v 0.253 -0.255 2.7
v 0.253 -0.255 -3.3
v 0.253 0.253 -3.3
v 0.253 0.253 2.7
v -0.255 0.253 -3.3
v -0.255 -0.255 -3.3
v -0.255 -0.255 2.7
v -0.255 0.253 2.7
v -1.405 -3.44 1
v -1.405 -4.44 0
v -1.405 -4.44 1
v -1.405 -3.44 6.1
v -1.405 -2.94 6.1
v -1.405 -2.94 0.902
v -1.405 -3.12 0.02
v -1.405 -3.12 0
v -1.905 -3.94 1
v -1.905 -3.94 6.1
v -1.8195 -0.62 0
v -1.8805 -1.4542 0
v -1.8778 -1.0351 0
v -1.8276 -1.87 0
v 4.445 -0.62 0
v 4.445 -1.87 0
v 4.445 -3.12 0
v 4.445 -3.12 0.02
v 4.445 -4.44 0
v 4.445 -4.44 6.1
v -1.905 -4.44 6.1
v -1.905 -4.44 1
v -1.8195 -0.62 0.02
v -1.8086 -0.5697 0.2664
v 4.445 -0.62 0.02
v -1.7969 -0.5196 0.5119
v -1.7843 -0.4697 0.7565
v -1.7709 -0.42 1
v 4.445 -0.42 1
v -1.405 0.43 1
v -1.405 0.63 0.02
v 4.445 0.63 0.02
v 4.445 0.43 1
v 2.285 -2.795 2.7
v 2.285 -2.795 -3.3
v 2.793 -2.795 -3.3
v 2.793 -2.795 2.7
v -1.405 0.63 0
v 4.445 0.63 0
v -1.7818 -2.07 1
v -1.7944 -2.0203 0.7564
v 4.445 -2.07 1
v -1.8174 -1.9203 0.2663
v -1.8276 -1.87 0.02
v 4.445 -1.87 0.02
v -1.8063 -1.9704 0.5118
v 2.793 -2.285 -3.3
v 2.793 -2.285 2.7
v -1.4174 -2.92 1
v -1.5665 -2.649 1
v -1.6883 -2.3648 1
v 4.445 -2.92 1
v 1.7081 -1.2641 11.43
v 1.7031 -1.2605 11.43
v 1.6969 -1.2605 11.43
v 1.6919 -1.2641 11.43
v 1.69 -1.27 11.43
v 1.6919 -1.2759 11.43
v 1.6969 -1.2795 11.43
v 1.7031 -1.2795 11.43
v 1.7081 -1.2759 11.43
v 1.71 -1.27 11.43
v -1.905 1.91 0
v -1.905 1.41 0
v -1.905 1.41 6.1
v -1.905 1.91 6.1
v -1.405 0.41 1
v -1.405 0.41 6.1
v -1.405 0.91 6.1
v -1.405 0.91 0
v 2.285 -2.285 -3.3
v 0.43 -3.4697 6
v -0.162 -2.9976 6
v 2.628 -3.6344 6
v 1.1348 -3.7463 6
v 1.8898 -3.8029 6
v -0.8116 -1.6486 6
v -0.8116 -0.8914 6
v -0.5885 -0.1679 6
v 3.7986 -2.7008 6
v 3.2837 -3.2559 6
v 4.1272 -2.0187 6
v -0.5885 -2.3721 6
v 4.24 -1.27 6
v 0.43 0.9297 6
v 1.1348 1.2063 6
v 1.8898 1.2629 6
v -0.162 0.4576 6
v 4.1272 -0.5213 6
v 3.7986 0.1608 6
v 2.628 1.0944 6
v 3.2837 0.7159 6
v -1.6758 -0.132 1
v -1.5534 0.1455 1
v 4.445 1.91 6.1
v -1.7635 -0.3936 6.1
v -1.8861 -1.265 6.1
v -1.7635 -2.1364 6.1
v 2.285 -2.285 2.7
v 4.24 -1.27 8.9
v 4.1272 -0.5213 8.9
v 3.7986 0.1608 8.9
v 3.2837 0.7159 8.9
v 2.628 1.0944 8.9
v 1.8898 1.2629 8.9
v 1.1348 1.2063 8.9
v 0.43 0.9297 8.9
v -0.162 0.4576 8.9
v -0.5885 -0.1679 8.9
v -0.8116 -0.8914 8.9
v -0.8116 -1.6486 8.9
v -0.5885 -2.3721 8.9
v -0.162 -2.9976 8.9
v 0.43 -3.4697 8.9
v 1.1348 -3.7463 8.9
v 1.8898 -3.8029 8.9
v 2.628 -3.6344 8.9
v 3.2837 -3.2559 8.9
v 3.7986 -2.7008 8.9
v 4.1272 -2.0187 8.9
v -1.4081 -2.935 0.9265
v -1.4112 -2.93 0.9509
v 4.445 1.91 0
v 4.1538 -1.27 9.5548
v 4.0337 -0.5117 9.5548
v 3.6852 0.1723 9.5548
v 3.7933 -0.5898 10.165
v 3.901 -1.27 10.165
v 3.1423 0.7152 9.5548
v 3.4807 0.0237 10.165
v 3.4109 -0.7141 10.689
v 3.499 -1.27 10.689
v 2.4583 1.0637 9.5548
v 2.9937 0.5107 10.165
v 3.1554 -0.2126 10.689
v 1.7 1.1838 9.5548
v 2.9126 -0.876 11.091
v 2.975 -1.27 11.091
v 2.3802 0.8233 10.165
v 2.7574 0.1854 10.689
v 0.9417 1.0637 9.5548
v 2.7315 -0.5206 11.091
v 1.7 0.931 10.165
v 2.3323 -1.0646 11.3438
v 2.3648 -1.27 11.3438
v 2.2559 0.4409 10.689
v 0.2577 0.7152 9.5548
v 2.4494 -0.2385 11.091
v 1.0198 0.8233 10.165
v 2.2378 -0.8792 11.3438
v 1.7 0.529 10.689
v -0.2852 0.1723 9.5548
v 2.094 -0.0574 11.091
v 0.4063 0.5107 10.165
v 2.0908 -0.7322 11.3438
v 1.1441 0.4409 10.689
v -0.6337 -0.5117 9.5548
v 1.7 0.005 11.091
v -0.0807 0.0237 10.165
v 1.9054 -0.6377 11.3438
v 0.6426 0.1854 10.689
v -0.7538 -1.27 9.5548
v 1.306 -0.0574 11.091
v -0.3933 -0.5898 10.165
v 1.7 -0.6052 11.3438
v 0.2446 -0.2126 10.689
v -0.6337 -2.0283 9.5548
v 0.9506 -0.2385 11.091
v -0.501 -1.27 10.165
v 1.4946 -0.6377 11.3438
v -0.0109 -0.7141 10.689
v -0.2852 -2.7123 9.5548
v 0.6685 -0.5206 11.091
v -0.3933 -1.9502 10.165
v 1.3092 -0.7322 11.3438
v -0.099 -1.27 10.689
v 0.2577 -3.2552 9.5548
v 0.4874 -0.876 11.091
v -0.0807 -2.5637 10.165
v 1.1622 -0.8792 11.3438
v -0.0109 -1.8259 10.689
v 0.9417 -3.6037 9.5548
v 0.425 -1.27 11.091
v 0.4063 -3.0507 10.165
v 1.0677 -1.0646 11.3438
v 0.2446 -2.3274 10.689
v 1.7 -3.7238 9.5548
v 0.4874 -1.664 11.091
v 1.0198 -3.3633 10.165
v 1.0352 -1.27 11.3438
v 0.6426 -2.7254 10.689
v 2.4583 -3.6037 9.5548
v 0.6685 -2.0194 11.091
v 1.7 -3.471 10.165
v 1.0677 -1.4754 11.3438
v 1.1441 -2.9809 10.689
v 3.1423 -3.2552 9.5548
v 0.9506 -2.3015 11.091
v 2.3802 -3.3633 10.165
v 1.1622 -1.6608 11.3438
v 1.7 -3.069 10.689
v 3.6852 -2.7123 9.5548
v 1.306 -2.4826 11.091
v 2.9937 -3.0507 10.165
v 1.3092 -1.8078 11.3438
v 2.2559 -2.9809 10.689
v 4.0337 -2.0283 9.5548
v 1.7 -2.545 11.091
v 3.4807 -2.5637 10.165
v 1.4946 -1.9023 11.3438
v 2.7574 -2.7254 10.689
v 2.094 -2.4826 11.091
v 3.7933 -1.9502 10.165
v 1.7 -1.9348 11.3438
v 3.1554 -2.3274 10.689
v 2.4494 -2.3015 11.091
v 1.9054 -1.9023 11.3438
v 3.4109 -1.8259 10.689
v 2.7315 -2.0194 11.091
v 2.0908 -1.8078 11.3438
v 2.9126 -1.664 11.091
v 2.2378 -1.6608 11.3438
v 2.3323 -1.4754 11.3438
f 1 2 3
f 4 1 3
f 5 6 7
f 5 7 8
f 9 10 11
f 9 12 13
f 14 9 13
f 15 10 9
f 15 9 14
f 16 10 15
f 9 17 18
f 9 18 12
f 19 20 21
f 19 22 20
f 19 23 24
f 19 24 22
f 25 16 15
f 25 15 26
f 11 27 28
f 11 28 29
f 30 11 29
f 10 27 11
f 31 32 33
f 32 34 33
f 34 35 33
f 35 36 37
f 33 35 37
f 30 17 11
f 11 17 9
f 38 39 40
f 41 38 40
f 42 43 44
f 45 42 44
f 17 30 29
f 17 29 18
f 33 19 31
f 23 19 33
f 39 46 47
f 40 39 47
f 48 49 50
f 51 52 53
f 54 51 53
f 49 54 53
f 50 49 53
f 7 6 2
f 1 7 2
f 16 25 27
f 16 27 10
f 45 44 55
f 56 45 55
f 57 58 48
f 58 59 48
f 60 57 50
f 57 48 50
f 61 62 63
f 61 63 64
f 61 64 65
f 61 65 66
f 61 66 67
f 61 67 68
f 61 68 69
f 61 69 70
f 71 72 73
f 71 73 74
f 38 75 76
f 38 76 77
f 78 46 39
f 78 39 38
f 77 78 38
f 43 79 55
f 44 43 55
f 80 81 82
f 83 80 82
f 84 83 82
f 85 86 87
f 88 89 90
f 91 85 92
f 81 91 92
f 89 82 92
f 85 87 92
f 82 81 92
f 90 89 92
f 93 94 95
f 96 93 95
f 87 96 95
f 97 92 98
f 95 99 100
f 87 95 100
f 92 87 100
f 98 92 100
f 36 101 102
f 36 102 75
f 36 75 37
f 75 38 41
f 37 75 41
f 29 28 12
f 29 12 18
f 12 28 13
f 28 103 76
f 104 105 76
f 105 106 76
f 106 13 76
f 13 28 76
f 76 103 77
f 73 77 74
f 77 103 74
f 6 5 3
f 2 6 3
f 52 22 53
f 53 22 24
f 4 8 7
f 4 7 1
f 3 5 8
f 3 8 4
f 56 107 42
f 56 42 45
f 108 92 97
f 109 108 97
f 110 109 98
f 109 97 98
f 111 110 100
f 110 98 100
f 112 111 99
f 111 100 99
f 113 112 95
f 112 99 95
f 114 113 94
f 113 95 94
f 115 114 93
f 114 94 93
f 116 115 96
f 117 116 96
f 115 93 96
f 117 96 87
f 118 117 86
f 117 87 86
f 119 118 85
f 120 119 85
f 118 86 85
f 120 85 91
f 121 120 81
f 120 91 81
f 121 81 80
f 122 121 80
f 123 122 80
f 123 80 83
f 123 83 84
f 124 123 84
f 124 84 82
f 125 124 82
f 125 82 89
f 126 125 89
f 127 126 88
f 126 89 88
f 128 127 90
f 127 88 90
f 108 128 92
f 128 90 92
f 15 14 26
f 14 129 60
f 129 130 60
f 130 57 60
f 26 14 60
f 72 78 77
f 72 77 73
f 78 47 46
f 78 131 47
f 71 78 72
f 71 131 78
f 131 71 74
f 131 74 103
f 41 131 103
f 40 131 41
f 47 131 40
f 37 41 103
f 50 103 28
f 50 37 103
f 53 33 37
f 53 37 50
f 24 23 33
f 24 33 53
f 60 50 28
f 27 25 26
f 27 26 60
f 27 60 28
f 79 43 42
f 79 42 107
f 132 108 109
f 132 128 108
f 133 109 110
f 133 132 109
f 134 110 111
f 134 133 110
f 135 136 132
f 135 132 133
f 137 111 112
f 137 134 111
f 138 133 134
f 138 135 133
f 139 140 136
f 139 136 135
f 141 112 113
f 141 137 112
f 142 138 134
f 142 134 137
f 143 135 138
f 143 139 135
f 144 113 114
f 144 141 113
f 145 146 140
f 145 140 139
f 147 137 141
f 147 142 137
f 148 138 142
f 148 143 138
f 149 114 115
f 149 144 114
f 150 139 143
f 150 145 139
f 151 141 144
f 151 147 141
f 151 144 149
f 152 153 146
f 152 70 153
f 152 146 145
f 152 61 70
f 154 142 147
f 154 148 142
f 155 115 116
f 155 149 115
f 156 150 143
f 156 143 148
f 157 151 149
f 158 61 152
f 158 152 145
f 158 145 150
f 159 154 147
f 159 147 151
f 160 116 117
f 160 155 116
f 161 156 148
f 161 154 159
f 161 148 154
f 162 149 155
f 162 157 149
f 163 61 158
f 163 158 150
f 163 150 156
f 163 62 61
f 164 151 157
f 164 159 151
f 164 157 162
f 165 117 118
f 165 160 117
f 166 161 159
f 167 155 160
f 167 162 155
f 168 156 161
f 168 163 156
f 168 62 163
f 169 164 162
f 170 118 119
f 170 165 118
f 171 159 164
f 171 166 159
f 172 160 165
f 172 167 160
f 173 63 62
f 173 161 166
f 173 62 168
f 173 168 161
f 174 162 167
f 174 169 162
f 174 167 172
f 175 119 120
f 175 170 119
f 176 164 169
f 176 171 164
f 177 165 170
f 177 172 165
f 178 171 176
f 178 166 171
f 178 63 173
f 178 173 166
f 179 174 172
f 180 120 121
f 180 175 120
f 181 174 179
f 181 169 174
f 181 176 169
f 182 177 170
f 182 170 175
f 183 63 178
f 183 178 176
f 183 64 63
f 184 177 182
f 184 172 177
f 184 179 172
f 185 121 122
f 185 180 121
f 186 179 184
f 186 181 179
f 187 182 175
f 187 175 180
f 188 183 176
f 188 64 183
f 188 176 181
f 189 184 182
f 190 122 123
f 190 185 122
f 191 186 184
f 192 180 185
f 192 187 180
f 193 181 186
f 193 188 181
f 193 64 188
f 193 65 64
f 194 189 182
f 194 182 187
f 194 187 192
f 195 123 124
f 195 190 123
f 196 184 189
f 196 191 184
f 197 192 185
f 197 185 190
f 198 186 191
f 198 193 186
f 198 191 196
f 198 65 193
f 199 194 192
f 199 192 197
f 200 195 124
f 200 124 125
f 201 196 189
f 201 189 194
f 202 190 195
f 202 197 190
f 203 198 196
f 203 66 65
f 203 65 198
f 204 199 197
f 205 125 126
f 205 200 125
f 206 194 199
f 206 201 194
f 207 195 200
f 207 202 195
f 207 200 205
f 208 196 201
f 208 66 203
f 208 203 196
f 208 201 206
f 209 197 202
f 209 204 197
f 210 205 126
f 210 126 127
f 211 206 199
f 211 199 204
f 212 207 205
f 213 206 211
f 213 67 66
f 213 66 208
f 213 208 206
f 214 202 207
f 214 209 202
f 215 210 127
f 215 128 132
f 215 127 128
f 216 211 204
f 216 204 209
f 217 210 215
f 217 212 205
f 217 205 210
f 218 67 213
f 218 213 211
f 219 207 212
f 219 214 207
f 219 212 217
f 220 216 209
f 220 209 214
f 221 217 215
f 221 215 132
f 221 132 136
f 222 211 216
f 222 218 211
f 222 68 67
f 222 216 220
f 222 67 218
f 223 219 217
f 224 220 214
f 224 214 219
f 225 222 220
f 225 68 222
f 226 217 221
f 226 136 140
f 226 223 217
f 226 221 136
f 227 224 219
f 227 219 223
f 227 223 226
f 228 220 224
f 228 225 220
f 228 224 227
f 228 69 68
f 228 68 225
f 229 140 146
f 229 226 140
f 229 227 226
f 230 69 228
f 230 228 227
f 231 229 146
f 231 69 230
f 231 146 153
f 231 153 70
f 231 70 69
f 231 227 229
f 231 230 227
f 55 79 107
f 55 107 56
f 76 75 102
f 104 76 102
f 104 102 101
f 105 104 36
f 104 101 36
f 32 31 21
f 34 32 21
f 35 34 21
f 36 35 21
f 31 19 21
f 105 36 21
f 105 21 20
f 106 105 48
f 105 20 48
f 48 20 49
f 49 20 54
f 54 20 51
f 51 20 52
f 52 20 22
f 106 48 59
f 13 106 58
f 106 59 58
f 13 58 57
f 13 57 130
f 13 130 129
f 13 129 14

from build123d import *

# Parameters (mm, degrees)
BOX_W            = 0.508
BOX_H            = 0.508
BOX_DEPTH        = 6
BOX001_W         = 0.508
BOX001_H         = 0.51
BOX001_DEPTH     = 6
BOX002_W         = 10
BOX002_H         = 1.25
BOX002_DEPTH     = 1
CHAMFER_SIZE2    = 0.2
CHAMFER_SIZE     = 0.98
CHAMFER002_SIZE2 = 0.98
CHAMFER002_SIZE  = 0.2
BOX003_W         = 10
BOX003_H         = 1.25
BOX003_DEPTH     = 1
CHAMFER001_SIZE2 = 0.2
CHAMFER001_SIZE  = 0.98
CHAMFER003_SIZE2 = 0.98
CHAMFER003_SIZE  = 0.2
BOX004_W         = 2
BOX004_H         = 2
BOX004_DEPTH     = 10
PAD_DEPTH        = 6.1
CYLINDER_R       = 2.54
CYLINDER_DEPTH   = 5.43
FILLET_R         = 2.53


with BuildPart() as anode:
    # Box → Box (new body)
    with BuildSketch(Plane(origin=(-0.255, -0.255, -3.3), x_dir=(1, 0, 0), z_dir=(0, 0, 1))):
        with Locations((0.254, 0.254)):
            Rectangle(BOX_W, BOX_H)
    extrude(amount=BOX_DEPTH)


with BuildPart() as cathode:
    # Box001 → Box001 (new body)
    with BuildSketch(Plane(origin=(2.285, -2.795, -3.3), x_dir=(1, 0, 0), z_dir=(0, 0, 1))):
        with Locations((0.254, 0.255)):
            Rectangle(BOX001_W, BOX001_H)
    extrude(amount=BOX001_DEPTH)


with BuildPart() as chamfer002:
    # Box002 → Box002 (new body)
    with BuildSketch(Plane(origin=(-5, -1.85, 0), x_dir=(1, 0, 0), z_dir=(0, 0, 1))):
        with Locations((5, 0.625)):
            Rectangle(BOX002_W, BOX002_H)
    extrude(amount=BOX002_DEPTH)

    # Chamfer
    chamfer_edges = [chamfer002.edges().sort_by_distance(p)[0] for p in [
        (0, -1.85, 1),
    ]]
    chamfer_side = chamfer002.faces().sort_by_distance((0, -1.85, 0.5))[0]
    chamfer(chamfer_edges, length=CHAMFER_SIZE, length2=CHAMFER_SIZE2, reference=chamfer_side)

    # Chamfer002
    chamfer002_edges = [chamfer002.edges().sort_by_distance(p)[0] for p in [
        (0, -0.6, 1),
    ]]
    chamfer002_side = chamfer002.faces().sort_by_distance((0, -1.125, 1))[0]
    chamfer(chamfer002_edges, length=CHAMFER002_SIZE, length2=CHAMFER002_SIZE2, reference=chamfer002_side)


with BuildPart() as chamfer002_1:
    # Chamfer002 placement: moved
    add(chamfer002.part.moved(Location((0, -1.27, 0))))


with BuildPart() as chamfer003:
    # Box003 → Box003 (new body)
    with BuildSketch(Plane(origin=(-5, 0.65, 0), x_dir=(1, 0, 0), z_dir=(0, 0, 1))):
        with Locations((5, 0.625)):
            Rectangle(BOX003_W, BOX003_H)
    extrude(amount=BOX003_DEPTH)

    # Chamfer001
    chamfer001_edges = [chamfer003.edges().sort_by_distance(p)[0] for p in [
        (0, 0.65, 1),
    ]]
    chamfer001_side = chamfer003.faces().sort_by_distance((0, 0.65, 0.5))[0]
    chamfer(chamfer001_edges, length=CHAMFER001_SIZE, length2=CHAMFER001_SIZE2, reference=chamfer001_side)

    # Chamfer003
    chamfer003_edges = [chamfer003.edges().sort_by_distance(p)[0] for p in [
        (0, 1.9, 1),
    ]]
    chamfer003_side = chamfer003.faces().sort_by_distance((0, 1.375, 1))[0]
    chamfer(chamfer003_edges, length=CHAMFER003_SIZE, length2=CHAMFER003_SIZE2, reference=chamfer003_side)


with BuildPart() as chamfer003_1:
    # Chamfer003 placement: moved
    add(chamfer003.part.moved(Location((0, -1.27, 0))))


with BuildPart() as kub002:
    # Box004 → Box004 (new body)
    with BuildSketch(Plane(origin=(-3.405, -5, -9), x_dir=(1, 0, 0), z_dir=(0, 0, 1))):
        with Locations((1, 1)):
            Rectangle(BOX004_W, BOX004_H)
    extrude(amount=BOX004_DEPTH)


with BuildPart() as cut002:
    # Sketch → Pad (new body)
    with BuildSketch(Plane.XY):
        with BuildLine():
            Line((-1.405, 0.41), (-1.405, 0.91))
            Line((-1.405, 0.91), (-1.905, 1.41))
            Line((-1.905, 1.41), (-1.905, 1.91))
            Line((-1.905, 1.91), (4.445, 1.91))
            Line((4.445, 1.91), (4.445, -4.44))
            Line((4.445, -4.44), (-1.905, -4.44))
            Line((-1.905, -4.44), (-1.905, -3.94))
            Line((-1.905, -3.94), (-1.405, -3.44))
            Line((-1.405, -3.44), (-1.405, -2.94))
            ThreePointArc((-1.405, 0.41), (-1.886145, -1.265), (-1.405, -2.94))
        make_face()
    extrude(amount=PAD_DEPTH)

    # Cut: cut Kub002
    add(kub002.part, mode=Mode.SUBTRACT)

    # Cut001: cut Chamfer003
    add(chamfer003_1.part, mode=Mode.SUBTRACT)

    # Cut002: cut Chamfer002
    add(chamfer002_1.part, mode=Mode.SUBTRACT)


with BuildPart() as fillet_body:
    # Cylinder → Cylinder (new body)
    with BuildSketch(Plane(origin=(1.7, -1.27, 6), x_dir=(1, 0, 0), z_dir=(0, 0, 1))):
        Circle(CYLINDER_R)
    extrude(amount=CYLINDER_DEPTH)

    # Fillet
    fillet_edges = [fillet_body.edges().sort_by_distance(p)[0] for p in [
        (-0.84, -1.27, 11.43),
    ]]
    fillet(fillet_edges, radius=FILLET_R)


solid = Compound([anode.part, cathode.part, cut002.part, fillet_body.part])
